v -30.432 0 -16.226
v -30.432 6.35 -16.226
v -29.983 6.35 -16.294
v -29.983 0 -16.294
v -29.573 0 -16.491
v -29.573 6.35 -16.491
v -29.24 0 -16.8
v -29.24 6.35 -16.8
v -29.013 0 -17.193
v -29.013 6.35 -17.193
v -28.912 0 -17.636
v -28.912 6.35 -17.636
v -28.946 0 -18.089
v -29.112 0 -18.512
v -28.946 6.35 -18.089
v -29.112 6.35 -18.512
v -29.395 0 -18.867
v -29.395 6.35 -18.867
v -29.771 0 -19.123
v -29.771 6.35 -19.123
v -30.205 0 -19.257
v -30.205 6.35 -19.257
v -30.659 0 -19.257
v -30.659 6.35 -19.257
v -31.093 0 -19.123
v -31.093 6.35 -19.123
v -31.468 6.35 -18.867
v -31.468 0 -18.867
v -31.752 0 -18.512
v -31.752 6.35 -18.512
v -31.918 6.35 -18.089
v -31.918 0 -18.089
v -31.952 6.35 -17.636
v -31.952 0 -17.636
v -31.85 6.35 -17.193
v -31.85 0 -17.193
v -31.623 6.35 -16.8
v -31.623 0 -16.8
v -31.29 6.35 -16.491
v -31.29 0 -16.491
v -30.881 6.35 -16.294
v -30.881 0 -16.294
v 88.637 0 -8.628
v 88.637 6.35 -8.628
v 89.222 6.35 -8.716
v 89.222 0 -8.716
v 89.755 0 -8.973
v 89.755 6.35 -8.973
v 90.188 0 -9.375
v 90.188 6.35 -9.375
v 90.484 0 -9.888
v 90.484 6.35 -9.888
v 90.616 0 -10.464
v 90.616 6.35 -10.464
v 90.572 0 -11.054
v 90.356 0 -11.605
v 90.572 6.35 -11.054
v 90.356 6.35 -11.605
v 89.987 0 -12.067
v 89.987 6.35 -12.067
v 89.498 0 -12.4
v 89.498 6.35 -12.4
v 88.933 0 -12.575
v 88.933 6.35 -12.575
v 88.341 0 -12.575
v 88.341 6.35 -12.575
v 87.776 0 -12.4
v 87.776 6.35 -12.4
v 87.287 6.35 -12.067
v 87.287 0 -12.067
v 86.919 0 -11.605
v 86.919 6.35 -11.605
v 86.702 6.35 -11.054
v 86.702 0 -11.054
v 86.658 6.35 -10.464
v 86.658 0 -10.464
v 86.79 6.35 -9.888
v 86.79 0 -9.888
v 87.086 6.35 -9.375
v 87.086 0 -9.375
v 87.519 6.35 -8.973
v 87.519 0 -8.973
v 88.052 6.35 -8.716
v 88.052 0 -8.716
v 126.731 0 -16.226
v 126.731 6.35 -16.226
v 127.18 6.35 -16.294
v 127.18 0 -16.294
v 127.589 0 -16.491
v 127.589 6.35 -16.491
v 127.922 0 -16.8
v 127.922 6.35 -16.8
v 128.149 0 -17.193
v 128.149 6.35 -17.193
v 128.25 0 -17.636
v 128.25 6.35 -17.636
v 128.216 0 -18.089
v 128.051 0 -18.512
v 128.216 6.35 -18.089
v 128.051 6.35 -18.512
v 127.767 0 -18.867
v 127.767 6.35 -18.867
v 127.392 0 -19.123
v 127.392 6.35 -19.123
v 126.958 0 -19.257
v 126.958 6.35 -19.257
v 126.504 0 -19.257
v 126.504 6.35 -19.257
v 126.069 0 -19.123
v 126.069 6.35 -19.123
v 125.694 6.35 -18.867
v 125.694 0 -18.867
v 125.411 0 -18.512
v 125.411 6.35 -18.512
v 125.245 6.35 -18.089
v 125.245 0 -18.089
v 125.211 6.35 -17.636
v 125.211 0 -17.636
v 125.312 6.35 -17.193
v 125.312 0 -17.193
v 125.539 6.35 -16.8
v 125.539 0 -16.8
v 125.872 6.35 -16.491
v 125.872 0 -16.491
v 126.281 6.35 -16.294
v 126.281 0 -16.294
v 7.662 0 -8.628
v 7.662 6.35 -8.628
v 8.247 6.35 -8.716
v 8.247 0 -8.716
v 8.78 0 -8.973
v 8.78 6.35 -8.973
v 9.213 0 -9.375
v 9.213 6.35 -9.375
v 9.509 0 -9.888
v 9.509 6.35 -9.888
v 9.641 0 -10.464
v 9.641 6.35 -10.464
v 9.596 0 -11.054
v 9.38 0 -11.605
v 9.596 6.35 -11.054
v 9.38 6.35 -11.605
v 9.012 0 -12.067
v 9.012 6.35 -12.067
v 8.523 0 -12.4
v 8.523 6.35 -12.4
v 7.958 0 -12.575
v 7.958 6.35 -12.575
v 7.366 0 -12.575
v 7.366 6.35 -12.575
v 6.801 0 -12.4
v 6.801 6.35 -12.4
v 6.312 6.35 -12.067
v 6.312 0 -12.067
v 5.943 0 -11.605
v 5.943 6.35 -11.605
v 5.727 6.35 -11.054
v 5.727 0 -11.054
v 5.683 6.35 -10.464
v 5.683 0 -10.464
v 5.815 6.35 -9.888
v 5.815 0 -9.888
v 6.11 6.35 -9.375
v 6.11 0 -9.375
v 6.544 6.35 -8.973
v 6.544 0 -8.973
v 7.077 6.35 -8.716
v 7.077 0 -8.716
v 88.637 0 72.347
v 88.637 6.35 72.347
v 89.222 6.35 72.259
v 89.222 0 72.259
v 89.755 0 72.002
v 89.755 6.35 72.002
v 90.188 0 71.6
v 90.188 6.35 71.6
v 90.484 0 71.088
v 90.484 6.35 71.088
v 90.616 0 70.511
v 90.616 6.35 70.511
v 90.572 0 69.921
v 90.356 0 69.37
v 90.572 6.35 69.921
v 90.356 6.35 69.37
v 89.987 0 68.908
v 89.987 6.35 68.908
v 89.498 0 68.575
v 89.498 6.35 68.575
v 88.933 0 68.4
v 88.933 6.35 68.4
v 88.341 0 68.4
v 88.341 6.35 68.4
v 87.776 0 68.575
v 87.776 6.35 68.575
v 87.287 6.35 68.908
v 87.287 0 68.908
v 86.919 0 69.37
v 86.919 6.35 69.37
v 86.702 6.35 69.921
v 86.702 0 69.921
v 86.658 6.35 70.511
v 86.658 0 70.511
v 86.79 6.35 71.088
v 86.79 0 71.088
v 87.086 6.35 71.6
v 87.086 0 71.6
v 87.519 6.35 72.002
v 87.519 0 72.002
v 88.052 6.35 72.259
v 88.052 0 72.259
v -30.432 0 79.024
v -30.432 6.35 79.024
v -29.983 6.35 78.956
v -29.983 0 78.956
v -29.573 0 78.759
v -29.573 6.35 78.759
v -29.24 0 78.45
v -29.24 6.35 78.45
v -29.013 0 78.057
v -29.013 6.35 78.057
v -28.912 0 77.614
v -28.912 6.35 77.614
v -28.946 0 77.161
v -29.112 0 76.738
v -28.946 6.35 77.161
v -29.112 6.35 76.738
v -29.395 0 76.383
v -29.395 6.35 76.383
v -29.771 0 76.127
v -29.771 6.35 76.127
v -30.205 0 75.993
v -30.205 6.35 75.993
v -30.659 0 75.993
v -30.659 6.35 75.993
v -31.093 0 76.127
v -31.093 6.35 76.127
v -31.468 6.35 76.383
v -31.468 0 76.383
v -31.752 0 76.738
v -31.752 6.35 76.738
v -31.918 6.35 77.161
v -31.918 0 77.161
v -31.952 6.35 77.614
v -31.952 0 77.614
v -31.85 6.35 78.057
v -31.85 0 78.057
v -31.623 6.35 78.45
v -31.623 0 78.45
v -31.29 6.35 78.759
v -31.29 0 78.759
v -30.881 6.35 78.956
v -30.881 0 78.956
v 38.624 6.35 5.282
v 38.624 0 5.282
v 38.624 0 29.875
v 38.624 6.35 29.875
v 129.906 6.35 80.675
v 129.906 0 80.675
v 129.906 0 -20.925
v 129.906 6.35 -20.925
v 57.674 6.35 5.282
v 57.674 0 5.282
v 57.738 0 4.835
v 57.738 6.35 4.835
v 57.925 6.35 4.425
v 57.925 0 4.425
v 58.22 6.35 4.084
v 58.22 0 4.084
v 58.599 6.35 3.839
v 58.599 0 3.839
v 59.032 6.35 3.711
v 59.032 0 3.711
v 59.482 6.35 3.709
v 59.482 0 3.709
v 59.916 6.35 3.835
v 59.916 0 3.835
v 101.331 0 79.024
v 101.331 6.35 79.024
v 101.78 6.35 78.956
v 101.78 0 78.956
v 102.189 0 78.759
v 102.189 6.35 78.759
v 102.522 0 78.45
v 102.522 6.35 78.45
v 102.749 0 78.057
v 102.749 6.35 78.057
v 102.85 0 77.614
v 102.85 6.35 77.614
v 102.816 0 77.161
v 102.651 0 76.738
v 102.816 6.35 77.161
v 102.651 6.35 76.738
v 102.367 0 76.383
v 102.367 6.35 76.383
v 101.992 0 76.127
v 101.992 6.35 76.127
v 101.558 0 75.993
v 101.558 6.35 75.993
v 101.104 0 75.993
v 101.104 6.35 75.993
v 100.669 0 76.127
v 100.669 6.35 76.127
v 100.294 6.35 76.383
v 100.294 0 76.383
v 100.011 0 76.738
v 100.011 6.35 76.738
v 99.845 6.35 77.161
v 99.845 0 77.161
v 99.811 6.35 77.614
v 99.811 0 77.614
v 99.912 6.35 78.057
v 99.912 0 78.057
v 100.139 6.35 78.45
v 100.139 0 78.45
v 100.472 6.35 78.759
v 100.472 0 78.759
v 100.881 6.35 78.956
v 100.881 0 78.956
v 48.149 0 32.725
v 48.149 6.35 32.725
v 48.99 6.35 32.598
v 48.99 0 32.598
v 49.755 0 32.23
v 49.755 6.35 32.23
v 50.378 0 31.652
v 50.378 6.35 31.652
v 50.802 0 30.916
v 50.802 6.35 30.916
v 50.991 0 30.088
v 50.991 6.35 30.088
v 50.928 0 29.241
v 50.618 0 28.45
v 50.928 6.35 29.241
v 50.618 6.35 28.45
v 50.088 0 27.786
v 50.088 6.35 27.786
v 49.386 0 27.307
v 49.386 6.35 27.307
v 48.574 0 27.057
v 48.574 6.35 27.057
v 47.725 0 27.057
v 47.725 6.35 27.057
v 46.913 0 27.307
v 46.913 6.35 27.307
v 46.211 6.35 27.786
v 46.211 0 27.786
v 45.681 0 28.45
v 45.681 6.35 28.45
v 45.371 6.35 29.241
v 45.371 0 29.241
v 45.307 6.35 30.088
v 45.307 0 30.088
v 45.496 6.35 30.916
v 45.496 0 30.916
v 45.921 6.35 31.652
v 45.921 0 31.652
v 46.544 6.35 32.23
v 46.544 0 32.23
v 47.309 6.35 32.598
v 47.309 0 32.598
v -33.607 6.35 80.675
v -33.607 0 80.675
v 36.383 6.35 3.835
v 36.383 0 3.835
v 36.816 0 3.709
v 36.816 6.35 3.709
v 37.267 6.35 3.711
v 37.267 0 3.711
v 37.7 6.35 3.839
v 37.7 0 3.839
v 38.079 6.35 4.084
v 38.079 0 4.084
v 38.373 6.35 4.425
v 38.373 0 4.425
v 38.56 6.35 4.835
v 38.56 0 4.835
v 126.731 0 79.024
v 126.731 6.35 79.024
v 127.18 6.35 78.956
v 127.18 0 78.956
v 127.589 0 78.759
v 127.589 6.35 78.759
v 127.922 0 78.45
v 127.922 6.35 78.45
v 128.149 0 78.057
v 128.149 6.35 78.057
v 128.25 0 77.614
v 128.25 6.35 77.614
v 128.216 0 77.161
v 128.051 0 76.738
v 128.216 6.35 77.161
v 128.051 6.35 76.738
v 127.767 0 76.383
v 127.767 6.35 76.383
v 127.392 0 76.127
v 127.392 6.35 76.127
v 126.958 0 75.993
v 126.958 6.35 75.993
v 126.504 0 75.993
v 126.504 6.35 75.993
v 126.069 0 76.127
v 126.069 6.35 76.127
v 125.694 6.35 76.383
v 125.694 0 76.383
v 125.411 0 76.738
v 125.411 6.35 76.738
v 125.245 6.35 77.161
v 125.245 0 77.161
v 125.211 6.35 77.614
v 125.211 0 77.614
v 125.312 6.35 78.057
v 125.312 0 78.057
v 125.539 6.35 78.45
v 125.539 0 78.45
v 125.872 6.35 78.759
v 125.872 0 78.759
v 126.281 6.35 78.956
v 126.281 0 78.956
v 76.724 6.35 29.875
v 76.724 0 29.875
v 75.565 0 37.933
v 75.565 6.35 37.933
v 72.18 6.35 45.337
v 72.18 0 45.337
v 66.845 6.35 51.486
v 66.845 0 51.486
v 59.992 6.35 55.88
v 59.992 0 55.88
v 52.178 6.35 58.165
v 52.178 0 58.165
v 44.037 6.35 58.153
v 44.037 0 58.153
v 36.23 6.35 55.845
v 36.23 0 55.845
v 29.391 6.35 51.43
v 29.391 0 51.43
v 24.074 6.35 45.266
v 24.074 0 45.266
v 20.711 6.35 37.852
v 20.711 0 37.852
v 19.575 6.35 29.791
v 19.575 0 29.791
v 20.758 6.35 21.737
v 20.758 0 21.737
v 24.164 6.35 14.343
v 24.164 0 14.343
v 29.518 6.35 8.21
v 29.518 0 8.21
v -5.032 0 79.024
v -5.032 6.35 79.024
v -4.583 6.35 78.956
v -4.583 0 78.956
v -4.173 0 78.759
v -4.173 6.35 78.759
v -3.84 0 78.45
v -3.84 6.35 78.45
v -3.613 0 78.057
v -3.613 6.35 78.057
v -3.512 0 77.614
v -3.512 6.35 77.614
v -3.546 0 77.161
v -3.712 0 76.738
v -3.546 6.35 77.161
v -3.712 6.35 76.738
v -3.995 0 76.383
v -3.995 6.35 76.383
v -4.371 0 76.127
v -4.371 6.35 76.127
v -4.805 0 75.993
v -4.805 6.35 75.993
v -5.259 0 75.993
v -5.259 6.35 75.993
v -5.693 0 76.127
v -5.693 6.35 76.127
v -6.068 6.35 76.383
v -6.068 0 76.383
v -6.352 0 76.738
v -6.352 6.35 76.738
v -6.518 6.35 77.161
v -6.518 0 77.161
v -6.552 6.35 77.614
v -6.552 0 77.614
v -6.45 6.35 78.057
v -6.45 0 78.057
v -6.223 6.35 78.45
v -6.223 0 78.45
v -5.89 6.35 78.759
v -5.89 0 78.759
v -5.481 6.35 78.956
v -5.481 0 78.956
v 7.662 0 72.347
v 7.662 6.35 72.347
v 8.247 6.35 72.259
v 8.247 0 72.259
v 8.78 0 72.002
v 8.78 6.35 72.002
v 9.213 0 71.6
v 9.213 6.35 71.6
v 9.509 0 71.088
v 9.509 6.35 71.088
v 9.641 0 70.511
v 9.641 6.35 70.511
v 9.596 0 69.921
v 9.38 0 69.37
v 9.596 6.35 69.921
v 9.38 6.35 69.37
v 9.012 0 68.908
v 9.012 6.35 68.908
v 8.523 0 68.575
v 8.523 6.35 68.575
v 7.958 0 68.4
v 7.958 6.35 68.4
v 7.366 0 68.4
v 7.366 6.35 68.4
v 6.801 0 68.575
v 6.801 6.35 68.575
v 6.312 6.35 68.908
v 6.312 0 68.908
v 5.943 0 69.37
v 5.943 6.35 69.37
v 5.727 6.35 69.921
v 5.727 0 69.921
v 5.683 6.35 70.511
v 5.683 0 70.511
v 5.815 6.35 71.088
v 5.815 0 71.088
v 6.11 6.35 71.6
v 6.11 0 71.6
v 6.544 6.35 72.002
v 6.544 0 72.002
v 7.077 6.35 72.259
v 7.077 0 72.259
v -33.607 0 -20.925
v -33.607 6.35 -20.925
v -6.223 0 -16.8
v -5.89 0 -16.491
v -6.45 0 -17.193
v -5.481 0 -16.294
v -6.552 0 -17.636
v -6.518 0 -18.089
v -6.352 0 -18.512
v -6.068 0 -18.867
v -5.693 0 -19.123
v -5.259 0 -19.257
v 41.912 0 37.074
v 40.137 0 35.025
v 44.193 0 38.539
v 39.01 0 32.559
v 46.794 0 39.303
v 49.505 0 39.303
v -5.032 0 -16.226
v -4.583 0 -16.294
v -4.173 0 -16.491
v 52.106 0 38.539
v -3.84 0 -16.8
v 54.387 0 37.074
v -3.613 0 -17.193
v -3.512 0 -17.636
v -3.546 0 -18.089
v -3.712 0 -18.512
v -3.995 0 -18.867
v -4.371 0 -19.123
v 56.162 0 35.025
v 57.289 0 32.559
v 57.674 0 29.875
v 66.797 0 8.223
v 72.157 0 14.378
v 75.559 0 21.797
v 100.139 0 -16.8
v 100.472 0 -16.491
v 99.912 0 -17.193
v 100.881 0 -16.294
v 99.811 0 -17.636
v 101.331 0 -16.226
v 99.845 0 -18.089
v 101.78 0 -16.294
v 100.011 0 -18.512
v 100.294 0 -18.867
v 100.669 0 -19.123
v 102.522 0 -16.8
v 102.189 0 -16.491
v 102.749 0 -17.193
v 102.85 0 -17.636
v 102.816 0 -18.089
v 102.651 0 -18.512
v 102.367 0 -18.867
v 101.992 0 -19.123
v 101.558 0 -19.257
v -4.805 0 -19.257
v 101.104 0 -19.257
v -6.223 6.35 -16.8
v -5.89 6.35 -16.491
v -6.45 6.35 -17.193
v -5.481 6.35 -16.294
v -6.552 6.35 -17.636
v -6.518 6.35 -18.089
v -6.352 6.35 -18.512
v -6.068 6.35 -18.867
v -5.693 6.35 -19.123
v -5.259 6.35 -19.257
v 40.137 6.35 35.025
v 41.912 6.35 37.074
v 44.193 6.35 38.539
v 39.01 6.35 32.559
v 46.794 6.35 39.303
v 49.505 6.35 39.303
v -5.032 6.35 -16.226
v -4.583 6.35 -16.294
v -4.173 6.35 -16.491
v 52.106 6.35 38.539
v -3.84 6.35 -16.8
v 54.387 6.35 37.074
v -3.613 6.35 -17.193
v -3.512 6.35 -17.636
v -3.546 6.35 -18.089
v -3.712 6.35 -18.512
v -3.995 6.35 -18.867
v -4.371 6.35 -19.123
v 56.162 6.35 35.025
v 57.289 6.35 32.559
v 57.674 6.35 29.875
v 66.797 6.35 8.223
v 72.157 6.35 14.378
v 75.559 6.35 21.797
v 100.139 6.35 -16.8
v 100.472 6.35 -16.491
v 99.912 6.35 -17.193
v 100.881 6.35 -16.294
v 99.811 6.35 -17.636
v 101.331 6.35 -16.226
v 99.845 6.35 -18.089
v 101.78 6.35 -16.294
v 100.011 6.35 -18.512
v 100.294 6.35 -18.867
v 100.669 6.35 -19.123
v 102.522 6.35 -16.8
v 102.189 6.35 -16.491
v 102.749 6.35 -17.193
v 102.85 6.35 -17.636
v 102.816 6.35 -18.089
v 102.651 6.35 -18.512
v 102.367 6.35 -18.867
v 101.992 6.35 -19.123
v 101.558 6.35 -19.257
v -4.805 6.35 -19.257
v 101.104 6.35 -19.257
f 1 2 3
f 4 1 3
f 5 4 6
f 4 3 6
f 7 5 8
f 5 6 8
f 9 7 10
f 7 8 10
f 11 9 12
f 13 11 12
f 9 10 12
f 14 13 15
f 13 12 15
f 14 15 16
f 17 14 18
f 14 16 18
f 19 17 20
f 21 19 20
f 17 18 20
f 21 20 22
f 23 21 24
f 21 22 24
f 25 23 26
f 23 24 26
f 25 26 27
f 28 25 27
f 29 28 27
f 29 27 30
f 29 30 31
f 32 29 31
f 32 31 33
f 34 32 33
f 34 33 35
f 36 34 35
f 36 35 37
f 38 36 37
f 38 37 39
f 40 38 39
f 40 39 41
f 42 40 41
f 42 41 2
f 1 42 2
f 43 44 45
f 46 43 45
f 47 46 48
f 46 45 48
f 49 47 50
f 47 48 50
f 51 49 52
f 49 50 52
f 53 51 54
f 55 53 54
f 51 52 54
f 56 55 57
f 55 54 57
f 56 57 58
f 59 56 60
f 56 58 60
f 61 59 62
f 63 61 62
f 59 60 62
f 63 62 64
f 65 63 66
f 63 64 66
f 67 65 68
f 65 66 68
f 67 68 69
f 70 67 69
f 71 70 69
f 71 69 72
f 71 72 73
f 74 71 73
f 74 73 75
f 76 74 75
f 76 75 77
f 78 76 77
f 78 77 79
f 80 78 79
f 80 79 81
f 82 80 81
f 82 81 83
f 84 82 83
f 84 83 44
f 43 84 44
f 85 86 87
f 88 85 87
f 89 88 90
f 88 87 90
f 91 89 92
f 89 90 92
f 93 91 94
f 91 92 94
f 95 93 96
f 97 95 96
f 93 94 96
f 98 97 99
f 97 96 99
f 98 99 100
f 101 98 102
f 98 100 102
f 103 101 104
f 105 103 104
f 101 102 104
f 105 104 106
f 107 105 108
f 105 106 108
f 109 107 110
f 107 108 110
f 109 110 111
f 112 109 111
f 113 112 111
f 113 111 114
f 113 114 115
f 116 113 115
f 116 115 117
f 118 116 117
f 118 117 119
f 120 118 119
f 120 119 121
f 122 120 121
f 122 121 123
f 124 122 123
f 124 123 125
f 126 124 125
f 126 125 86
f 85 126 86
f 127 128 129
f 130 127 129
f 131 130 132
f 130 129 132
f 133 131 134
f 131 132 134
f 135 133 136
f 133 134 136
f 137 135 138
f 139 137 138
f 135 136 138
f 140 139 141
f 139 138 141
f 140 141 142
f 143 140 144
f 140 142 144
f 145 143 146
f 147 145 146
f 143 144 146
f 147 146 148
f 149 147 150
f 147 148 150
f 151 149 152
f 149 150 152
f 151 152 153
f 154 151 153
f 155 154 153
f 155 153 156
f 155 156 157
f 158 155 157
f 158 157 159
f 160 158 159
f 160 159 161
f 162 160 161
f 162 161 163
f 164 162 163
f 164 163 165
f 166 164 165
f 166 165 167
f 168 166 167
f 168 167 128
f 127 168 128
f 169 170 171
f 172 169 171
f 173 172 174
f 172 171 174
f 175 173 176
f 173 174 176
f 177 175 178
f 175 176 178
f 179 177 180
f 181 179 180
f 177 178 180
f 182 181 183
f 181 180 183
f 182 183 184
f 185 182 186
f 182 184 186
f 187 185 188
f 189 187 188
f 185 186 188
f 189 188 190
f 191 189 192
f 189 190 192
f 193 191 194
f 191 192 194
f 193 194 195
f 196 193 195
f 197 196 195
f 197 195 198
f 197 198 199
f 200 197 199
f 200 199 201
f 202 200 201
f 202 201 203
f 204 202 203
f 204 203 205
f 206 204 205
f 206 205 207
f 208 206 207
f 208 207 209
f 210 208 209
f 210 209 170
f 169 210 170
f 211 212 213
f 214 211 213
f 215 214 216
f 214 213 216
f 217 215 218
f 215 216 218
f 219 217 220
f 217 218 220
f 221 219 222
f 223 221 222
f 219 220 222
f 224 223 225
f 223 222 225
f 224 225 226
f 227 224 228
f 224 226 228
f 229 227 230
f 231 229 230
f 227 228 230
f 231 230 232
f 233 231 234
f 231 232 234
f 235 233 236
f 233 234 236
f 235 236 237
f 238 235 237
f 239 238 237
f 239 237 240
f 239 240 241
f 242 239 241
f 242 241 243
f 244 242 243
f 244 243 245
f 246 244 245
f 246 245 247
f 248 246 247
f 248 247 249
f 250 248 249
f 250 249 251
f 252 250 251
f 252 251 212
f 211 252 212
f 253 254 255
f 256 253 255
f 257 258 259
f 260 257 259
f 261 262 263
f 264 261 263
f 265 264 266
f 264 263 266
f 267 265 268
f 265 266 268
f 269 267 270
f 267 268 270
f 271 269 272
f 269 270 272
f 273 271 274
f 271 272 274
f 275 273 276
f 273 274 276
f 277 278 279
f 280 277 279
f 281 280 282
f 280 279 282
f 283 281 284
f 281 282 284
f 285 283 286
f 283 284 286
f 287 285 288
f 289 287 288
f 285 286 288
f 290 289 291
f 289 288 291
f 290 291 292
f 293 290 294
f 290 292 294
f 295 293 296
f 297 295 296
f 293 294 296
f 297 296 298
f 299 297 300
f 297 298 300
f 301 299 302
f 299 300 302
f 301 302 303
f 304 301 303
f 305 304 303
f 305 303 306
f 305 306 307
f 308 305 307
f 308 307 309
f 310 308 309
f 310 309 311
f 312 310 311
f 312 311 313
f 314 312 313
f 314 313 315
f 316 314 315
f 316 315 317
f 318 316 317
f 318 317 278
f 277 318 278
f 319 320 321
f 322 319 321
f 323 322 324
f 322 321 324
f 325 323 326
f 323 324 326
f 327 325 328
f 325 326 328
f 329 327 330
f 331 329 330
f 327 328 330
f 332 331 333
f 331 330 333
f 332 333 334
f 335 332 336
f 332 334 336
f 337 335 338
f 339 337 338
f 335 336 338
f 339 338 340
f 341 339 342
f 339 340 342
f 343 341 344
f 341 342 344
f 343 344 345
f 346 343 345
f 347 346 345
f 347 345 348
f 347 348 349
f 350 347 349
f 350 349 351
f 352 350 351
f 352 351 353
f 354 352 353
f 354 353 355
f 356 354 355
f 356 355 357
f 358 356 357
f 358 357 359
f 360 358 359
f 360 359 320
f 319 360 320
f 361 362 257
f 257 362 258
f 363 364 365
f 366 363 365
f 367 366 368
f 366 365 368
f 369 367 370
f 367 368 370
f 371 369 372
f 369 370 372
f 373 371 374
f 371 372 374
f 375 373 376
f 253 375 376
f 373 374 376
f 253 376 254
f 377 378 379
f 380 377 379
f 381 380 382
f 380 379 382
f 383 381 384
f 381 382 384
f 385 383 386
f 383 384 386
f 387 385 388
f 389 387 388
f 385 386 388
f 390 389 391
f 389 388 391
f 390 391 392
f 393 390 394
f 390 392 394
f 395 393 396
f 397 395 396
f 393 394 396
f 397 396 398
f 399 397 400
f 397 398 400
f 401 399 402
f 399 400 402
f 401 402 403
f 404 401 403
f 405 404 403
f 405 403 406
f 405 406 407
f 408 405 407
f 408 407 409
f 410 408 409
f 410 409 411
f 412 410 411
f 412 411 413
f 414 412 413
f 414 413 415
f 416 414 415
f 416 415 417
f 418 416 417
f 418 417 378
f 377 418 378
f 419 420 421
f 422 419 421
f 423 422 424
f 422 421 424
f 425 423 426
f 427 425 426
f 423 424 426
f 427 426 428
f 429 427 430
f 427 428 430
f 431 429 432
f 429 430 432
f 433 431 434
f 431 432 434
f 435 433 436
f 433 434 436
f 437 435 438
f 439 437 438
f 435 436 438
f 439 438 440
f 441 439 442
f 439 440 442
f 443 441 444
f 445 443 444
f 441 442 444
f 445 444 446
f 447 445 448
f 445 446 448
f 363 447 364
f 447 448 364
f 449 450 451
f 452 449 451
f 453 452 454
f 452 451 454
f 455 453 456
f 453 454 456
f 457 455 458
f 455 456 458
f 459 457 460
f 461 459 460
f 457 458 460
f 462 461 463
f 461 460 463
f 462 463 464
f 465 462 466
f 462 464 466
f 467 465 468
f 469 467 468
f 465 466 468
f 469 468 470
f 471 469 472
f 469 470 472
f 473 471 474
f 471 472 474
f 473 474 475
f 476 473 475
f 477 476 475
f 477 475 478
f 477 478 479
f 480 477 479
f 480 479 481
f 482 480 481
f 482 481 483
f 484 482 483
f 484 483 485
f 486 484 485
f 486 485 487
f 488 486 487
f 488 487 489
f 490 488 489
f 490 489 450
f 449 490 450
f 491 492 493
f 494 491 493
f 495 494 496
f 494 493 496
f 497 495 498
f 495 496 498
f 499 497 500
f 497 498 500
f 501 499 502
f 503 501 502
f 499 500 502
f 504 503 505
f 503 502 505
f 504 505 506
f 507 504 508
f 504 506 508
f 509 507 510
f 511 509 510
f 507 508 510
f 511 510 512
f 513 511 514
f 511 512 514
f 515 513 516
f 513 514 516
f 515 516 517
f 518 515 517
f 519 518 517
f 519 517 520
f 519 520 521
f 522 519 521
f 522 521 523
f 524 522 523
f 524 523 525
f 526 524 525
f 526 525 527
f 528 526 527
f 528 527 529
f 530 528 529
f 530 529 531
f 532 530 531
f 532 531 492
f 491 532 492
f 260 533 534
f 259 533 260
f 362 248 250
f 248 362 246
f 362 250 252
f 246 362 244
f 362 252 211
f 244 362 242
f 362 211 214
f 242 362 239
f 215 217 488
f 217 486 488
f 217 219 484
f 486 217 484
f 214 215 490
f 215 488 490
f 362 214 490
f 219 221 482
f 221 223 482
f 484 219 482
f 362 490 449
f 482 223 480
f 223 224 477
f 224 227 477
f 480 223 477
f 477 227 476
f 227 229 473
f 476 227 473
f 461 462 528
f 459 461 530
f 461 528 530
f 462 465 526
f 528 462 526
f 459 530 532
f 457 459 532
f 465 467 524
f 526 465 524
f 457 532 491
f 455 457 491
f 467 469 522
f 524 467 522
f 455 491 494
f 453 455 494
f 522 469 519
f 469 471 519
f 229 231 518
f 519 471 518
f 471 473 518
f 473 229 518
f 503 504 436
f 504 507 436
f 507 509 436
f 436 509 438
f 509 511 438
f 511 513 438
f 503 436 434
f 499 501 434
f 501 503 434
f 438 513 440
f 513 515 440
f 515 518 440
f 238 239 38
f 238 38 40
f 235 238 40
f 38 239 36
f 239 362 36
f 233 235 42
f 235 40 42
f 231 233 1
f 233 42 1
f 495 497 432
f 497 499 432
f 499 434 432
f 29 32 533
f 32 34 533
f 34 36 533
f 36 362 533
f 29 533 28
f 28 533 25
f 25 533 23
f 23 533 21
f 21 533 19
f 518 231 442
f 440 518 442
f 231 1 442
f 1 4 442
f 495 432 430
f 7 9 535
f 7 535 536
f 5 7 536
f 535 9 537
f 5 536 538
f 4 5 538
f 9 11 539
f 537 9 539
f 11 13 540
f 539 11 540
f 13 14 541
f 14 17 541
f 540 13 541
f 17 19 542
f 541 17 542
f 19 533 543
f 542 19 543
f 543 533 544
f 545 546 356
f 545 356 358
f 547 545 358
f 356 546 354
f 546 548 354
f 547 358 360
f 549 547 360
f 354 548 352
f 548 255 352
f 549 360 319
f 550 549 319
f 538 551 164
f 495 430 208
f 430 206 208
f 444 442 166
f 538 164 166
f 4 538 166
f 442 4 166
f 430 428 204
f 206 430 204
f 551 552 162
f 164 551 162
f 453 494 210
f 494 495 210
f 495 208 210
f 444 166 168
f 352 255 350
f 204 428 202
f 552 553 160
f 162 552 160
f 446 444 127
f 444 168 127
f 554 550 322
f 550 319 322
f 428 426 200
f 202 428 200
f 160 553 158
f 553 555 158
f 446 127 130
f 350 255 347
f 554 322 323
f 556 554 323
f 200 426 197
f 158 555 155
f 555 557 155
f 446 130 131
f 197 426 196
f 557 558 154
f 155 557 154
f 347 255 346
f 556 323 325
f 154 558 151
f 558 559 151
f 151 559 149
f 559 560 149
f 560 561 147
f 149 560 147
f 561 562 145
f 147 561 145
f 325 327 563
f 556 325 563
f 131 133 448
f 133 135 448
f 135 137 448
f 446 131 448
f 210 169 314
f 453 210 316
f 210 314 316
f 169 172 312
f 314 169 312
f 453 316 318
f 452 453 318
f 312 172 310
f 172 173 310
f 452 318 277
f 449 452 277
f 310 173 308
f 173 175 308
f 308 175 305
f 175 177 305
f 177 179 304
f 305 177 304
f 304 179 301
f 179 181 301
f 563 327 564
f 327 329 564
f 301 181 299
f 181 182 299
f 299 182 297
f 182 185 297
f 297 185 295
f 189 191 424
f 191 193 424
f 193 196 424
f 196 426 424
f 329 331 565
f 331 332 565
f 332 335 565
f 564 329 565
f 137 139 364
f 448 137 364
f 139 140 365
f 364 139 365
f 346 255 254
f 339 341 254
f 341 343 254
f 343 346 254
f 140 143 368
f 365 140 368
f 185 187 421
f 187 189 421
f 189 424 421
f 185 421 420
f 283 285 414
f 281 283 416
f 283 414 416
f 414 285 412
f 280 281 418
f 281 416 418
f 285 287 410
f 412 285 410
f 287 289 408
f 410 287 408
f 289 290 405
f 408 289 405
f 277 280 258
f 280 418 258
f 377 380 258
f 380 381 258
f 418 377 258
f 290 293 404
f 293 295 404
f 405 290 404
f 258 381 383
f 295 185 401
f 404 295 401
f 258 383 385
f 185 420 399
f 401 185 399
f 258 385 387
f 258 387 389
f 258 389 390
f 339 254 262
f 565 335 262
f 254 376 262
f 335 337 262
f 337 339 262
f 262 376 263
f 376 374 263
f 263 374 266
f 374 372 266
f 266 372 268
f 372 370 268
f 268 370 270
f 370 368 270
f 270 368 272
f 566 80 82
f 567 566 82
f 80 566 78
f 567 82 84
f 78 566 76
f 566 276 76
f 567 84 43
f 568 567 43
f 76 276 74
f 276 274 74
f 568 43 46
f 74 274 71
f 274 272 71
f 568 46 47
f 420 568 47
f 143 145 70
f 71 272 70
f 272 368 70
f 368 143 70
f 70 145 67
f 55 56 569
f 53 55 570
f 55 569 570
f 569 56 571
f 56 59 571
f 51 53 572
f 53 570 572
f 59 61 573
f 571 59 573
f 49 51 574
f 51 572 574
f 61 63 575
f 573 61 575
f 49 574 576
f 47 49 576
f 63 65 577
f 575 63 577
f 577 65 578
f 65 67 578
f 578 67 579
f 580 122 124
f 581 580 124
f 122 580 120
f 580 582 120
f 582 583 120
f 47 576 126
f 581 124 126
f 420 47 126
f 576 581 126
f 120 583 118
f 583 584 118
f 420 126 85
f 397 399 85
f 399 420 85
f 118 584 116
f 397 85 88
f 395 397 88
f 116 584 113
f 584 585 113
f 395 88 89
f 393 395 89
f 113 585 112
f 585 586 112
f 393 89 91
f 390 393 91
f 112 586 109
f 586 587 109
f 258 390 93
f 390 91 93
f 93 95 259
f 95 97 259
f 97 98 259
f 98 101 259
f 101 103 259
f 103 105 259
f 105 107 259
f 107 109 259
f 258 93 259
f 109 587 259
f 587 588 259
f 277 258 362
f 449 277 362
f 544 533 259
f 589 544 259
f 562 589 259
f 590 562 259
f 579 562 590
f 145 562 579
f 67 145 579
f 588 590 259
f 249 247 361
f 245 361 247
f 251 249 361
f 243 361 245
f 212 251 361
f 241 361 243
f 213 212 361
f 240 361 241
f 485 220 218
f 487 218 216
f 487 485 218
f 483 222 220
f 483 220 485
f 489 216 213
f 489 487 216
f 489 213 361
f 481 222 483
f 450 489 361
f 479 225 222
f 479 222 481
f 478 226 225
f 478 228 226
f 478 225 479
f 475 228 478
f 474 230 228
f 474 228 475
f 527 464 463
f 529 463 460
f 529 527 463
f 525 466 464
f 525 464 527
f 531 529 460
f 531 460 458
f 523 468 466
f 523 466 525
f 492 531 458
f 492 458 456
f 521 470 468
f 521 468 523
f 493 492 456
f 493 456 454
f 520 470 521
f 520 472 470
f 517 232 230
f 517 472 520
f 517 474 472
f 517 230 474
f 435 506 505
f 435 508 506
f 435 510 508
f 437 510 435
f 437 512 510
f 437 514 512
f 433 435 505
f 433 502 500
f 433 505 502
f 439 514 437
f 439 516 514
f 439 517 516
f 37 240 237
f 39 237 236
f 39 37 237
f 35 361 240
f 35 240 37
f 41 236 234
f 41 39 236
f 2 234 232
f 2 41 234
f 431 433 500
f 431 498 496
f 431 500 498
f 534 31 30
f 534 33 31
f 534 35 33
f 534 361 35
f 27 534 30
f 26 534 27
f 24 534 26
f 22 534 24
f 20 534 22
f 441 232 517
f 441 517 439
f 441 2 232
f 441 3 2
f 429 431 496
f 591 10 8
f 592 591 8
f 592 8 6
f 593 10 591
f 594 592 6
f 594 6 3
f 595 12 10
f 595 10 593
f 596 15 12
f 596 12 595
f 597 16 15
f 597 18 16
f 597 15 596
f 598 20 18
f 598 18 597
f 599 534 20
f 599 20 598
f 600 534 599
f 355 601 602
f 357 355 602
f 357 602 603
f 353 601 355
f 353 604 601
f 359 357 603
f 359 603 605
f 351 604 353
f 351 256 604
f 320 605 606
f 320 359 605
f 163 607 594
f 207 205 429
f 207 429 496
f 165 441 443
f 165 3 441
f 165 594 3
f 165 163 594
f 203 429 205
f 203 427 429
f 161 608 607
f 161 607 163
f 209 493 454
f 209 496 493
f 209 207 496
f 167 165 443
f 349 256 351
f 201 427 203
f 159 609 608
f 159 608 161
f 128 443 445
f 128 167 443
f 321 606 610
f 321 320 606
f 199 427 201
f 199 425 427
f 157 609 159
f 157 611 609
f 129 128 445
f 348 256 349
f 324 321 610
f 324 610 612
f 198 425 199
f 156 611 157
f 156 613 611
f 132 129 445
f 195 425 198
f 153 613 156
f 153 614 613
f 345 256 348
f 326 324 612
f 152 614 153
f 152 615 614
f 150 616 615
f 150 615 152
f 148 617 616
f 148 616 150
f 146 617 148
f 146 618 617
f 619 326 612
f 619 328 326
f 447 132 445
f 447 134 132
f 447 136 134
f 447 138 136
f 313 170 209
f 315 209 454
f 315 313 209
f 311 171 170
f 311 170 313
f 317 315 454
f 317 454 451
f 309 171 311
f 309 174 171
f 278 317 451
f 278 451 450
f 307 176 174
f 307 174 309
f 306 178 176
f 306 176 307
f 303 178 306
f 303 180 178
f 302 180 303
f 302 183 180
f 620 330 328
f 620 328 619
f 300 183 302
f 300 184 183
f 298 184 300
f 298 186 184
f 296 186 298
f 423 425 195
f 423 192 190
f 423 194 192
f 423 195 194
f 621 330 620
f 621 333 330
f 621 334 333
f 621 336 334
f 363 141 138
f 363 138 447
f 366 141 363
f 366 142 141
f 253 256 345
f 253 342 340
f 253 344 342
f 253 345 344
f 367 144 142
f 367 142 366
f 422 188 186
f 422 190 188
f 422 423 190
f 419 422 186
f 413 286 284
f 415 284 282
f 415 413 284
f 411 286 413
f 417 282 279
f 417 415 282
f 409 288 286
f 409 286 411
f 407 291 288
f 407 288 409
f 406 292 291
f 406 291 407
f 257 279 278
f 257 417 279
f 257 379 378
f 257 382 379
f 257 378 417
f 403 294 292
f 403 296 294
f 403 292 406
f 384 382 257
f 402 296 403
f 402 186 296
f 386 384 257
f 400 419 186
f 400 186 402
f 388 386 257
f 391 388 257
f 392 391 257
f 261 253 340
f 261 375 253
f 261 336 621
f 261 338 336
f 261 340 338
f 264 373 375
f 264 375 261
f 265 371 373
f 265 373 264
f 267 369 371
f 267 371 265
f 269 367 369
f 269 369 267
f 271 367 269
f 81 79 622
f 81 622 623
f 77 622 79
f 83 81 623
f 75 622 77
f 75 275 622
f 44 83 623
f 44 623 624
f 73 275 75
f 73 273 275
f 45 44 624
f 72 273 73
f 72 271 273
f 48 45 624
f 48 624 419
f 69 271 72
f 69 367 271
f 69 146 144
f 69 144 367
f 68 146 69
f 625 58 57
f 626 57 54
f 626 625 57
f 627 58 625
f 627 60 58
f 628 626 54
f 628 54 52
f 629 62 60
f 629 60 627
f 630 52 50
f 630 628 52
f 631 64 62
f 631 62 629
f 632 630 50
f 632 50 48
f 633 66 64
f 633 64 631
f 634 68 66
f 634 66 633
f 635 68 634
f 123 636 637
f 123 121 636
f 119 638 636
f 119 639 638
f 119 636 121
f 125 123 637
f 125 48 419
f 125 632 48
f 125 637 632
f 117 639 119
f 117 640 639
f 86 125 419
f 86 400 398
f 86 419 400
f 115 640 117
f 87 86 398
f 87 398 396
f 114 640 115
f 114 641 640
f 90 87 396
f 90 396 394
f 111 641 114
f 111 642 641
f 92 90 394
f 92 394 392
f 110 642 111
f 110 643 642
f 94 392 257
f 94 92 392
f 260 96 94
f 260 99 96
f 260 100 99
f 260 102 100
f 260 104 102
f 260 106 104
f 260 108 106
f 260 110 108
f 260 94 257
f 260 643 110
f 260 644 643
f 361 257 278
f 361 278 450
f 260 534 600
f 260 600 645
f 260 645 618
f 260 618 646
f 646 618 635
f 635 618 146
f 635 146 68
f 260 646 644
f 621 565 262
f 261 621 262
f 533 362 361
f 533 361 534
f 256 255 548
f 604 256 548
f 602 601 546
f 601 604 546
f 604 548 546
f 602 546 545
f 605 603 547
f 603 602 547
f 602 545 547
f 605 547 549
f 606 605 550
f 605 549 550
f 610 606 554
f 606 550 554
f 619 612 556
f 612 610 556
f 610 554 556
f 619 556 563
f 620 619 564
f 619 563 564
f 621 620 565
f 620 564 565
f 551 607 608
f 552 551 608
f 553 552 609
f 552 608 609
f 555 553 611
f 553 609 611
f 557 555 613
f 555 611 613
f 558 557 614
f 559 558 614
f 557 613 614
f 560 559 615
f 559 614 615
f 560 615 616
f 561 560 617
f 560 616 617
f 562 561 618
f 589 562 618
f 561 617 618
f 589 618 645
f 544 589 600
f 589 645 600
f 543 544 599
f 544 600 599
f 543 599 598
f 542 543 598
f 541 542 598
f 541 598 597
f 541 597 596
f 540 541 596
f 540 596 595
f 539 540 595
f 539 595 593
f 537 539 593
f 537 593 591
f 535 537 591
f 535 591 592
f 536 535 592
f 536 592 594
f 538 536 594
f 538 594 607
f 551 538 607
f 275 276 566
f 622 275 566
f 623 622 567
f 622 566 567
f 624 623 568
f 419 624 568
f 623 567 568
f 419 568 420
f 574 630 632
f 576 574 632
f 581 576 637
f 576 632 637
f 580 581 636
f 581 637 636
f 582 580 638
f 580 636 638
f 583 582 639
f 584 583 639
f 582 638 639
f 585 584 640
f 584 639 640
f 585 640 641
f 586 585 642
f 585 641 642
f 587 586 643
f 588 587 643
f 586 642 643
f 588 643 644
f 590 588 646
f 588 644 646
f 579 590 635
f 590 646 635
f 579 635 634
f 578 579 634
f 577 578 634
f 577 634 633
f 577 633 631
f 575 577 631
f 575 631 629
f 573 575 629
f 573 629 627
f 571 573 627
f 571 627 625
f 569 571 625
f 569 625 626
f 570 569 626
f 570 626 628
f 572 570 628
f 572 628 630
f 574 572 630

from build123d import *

# Parameters (mm, degrees)
SKETCH2_W          = 163.5125
SKETCH2_H          = 101.6
EXTRUDE1_DEPTH     = 6.35
SKETCH3_R          = 1.524
CUT_EXTRUDE1_DEPTH = 7.35
SKETCH4_R          = 1.984375
CUT_EXTRUDE2_DEPTH = 7.35
SKETCH5_R          = 2.850007
CUT_EXTRUDE3_DEPTH = 7.35
CUT_EXTRUDE4_DEPTH = 7.35


with BuildPart() as part:
    # Sketch2 → Extrude1 (new body)
    with BuildSketch(Plane(origin=(0, 0, 0), x_dir=(1, 0, 0), z_dir=(0, 1, 0))):
        with Locations((48.149449764, -29.875011174)):
            Rectangle(SKETCH2_W, SKETCH2_H)
    extrude(amount=EXTRUDE1_DEPTH)

    # Sketch3 → Cut-Extrude1 (cut, through all)
    with BuildSketch(Plane(origin=(0, 6.35, 0), x_dir=(1, 0, 0), z_dir=(0, 1, 0))):
        with Locations(Location((-30.431800236, 17.749988826, 0), (0, 0, 270))):  # turned: the seam where the file's is
            Circle(SKETCH3_R)
        with Locations(Location((-30.431800236, -77.500011174, 0), (0, 0, 270))):  # turned: the seam where the file's is
            Circle(SKETCH3_R)
        with Locations(Location((126.730699764, -77.500011174, 0), (0, 0, 270))):  # turned: the seam where the file's is
            Circle(SKETCH3_R)
        with Locations(Location((126.730699764, 17.749988826, 0), (0, 0, 270))):  # turned: the seam where the file's is
            Circle(SKETCH3_R)
        with Locations(Location((-5.031800236, 17.749988826, 0), (0, 0, 270))):  # turned: the seam where the file's is
            Circle(SKETCH3_R)
        with Locations(Location((-5.031800236, -77.500011174, 0), (0, 0, 270))):  # turned: the seam where the file's is
            Circle(SKETCH3_R)
        with Locations(Location((101.330699764, 17.749988826, 0), (0, 0, 270))):  # turned: the seam where the file's is
            Circle(SKETCH3_R)
        with Locations(Location((101.330699764, -77.500011174, 0), (0, 0, 270))):  # turned: the seam where the file's is
            Circle(SKETCH3_R)
    extrude(amount=-CUT_EXTRUDE1_DEPTH, mode=Mode.SUBTRACT)

    # Sketch4 → Cut-Extrude2 (cut, through all)
    with BuildSketch(Plane(origin=(0, 6.35, 0), x_dir=(1, 0, 0), z_dir=(0, 1, 0))):
        with Locations(Location((7.661849764, 10.612588826, 0), (0, 0, 270))):  # turned: the seam where the file's is
            Circle(SKETCH4_R)
        with Locations(Location((88.637049764, 10.612588826, 0), (0, 0, 270))):  # turned: the seam where the file's is
            Circle(SKETCH4_R)
        with Locations(Location((7.661849764, -70.362611174, 0), (0, 0, 270))):  # turned: the seam where the file's is
            Circle(SKETCH4_R)
        with Locations(Location((88.637049764, -70.362611174, 0), (0, 0, 270))):  # turned: the seam where the file's is
            Circle(SKETCH4_R)
    extrude(amount=-CUT_EXTRUDE2_DEPTH, mode=Mode.SUBTRACT)

    # Sketch5 → Cut-Extrude3 (cut, through all)
    with BuildSketch(Plane(origin=(0, 6.35, 0), x_dir=(1, 0, 0), z_dir=(0, 1, 0))):
        with Locations(Location((48.149449764, -29.875011174, 0), (0, 0, 270))):  # turned: the seam where the file's is
            Circle(SKETCH5_R)
    extrude(amount=-CUT_EXTRUDE3_DEPTH, mode=Mode.SUBTRACT)

    # Sketch6 → Cut-Extrude4 (cut, through all)
    with BuildSketch(Plane.XZ):
        with BuildLine():
            Line((38.624449764, 5.281566926), (38.624449764, 29.875011174))
            ThreePointArc((38.624449764, 29.875011174), (48.149449764, 39.400011174), (57.674449764, 29.875011174))
            Line((57.674449764, 29.875011174), (57.674449764, 5.281566926))
            ThreePointArc((57.674449764, 5.281566926), (58.40100701, 3.947800145), (59.915626235, 3.834893734))
            ThreePointArc((59.915626235, 3.834893734), (72.157251805, 14.378041594), (76.724449764, 29.875011174))
            ThreePointArc((76.724449764, 29.875011174), (32.652480184, 53.882813215), (36.383273294, 3.834893734))
            ThreePointArc((36.383273294, 3.834893734), (37.897892519, 3.947800145), (38.624449764, 5.281566926))
        make_face()
    extrude(amount=-CUT_EXTRUDE4_DEPTH, mode=Mode.SUBTRACT)


solid = part.part
